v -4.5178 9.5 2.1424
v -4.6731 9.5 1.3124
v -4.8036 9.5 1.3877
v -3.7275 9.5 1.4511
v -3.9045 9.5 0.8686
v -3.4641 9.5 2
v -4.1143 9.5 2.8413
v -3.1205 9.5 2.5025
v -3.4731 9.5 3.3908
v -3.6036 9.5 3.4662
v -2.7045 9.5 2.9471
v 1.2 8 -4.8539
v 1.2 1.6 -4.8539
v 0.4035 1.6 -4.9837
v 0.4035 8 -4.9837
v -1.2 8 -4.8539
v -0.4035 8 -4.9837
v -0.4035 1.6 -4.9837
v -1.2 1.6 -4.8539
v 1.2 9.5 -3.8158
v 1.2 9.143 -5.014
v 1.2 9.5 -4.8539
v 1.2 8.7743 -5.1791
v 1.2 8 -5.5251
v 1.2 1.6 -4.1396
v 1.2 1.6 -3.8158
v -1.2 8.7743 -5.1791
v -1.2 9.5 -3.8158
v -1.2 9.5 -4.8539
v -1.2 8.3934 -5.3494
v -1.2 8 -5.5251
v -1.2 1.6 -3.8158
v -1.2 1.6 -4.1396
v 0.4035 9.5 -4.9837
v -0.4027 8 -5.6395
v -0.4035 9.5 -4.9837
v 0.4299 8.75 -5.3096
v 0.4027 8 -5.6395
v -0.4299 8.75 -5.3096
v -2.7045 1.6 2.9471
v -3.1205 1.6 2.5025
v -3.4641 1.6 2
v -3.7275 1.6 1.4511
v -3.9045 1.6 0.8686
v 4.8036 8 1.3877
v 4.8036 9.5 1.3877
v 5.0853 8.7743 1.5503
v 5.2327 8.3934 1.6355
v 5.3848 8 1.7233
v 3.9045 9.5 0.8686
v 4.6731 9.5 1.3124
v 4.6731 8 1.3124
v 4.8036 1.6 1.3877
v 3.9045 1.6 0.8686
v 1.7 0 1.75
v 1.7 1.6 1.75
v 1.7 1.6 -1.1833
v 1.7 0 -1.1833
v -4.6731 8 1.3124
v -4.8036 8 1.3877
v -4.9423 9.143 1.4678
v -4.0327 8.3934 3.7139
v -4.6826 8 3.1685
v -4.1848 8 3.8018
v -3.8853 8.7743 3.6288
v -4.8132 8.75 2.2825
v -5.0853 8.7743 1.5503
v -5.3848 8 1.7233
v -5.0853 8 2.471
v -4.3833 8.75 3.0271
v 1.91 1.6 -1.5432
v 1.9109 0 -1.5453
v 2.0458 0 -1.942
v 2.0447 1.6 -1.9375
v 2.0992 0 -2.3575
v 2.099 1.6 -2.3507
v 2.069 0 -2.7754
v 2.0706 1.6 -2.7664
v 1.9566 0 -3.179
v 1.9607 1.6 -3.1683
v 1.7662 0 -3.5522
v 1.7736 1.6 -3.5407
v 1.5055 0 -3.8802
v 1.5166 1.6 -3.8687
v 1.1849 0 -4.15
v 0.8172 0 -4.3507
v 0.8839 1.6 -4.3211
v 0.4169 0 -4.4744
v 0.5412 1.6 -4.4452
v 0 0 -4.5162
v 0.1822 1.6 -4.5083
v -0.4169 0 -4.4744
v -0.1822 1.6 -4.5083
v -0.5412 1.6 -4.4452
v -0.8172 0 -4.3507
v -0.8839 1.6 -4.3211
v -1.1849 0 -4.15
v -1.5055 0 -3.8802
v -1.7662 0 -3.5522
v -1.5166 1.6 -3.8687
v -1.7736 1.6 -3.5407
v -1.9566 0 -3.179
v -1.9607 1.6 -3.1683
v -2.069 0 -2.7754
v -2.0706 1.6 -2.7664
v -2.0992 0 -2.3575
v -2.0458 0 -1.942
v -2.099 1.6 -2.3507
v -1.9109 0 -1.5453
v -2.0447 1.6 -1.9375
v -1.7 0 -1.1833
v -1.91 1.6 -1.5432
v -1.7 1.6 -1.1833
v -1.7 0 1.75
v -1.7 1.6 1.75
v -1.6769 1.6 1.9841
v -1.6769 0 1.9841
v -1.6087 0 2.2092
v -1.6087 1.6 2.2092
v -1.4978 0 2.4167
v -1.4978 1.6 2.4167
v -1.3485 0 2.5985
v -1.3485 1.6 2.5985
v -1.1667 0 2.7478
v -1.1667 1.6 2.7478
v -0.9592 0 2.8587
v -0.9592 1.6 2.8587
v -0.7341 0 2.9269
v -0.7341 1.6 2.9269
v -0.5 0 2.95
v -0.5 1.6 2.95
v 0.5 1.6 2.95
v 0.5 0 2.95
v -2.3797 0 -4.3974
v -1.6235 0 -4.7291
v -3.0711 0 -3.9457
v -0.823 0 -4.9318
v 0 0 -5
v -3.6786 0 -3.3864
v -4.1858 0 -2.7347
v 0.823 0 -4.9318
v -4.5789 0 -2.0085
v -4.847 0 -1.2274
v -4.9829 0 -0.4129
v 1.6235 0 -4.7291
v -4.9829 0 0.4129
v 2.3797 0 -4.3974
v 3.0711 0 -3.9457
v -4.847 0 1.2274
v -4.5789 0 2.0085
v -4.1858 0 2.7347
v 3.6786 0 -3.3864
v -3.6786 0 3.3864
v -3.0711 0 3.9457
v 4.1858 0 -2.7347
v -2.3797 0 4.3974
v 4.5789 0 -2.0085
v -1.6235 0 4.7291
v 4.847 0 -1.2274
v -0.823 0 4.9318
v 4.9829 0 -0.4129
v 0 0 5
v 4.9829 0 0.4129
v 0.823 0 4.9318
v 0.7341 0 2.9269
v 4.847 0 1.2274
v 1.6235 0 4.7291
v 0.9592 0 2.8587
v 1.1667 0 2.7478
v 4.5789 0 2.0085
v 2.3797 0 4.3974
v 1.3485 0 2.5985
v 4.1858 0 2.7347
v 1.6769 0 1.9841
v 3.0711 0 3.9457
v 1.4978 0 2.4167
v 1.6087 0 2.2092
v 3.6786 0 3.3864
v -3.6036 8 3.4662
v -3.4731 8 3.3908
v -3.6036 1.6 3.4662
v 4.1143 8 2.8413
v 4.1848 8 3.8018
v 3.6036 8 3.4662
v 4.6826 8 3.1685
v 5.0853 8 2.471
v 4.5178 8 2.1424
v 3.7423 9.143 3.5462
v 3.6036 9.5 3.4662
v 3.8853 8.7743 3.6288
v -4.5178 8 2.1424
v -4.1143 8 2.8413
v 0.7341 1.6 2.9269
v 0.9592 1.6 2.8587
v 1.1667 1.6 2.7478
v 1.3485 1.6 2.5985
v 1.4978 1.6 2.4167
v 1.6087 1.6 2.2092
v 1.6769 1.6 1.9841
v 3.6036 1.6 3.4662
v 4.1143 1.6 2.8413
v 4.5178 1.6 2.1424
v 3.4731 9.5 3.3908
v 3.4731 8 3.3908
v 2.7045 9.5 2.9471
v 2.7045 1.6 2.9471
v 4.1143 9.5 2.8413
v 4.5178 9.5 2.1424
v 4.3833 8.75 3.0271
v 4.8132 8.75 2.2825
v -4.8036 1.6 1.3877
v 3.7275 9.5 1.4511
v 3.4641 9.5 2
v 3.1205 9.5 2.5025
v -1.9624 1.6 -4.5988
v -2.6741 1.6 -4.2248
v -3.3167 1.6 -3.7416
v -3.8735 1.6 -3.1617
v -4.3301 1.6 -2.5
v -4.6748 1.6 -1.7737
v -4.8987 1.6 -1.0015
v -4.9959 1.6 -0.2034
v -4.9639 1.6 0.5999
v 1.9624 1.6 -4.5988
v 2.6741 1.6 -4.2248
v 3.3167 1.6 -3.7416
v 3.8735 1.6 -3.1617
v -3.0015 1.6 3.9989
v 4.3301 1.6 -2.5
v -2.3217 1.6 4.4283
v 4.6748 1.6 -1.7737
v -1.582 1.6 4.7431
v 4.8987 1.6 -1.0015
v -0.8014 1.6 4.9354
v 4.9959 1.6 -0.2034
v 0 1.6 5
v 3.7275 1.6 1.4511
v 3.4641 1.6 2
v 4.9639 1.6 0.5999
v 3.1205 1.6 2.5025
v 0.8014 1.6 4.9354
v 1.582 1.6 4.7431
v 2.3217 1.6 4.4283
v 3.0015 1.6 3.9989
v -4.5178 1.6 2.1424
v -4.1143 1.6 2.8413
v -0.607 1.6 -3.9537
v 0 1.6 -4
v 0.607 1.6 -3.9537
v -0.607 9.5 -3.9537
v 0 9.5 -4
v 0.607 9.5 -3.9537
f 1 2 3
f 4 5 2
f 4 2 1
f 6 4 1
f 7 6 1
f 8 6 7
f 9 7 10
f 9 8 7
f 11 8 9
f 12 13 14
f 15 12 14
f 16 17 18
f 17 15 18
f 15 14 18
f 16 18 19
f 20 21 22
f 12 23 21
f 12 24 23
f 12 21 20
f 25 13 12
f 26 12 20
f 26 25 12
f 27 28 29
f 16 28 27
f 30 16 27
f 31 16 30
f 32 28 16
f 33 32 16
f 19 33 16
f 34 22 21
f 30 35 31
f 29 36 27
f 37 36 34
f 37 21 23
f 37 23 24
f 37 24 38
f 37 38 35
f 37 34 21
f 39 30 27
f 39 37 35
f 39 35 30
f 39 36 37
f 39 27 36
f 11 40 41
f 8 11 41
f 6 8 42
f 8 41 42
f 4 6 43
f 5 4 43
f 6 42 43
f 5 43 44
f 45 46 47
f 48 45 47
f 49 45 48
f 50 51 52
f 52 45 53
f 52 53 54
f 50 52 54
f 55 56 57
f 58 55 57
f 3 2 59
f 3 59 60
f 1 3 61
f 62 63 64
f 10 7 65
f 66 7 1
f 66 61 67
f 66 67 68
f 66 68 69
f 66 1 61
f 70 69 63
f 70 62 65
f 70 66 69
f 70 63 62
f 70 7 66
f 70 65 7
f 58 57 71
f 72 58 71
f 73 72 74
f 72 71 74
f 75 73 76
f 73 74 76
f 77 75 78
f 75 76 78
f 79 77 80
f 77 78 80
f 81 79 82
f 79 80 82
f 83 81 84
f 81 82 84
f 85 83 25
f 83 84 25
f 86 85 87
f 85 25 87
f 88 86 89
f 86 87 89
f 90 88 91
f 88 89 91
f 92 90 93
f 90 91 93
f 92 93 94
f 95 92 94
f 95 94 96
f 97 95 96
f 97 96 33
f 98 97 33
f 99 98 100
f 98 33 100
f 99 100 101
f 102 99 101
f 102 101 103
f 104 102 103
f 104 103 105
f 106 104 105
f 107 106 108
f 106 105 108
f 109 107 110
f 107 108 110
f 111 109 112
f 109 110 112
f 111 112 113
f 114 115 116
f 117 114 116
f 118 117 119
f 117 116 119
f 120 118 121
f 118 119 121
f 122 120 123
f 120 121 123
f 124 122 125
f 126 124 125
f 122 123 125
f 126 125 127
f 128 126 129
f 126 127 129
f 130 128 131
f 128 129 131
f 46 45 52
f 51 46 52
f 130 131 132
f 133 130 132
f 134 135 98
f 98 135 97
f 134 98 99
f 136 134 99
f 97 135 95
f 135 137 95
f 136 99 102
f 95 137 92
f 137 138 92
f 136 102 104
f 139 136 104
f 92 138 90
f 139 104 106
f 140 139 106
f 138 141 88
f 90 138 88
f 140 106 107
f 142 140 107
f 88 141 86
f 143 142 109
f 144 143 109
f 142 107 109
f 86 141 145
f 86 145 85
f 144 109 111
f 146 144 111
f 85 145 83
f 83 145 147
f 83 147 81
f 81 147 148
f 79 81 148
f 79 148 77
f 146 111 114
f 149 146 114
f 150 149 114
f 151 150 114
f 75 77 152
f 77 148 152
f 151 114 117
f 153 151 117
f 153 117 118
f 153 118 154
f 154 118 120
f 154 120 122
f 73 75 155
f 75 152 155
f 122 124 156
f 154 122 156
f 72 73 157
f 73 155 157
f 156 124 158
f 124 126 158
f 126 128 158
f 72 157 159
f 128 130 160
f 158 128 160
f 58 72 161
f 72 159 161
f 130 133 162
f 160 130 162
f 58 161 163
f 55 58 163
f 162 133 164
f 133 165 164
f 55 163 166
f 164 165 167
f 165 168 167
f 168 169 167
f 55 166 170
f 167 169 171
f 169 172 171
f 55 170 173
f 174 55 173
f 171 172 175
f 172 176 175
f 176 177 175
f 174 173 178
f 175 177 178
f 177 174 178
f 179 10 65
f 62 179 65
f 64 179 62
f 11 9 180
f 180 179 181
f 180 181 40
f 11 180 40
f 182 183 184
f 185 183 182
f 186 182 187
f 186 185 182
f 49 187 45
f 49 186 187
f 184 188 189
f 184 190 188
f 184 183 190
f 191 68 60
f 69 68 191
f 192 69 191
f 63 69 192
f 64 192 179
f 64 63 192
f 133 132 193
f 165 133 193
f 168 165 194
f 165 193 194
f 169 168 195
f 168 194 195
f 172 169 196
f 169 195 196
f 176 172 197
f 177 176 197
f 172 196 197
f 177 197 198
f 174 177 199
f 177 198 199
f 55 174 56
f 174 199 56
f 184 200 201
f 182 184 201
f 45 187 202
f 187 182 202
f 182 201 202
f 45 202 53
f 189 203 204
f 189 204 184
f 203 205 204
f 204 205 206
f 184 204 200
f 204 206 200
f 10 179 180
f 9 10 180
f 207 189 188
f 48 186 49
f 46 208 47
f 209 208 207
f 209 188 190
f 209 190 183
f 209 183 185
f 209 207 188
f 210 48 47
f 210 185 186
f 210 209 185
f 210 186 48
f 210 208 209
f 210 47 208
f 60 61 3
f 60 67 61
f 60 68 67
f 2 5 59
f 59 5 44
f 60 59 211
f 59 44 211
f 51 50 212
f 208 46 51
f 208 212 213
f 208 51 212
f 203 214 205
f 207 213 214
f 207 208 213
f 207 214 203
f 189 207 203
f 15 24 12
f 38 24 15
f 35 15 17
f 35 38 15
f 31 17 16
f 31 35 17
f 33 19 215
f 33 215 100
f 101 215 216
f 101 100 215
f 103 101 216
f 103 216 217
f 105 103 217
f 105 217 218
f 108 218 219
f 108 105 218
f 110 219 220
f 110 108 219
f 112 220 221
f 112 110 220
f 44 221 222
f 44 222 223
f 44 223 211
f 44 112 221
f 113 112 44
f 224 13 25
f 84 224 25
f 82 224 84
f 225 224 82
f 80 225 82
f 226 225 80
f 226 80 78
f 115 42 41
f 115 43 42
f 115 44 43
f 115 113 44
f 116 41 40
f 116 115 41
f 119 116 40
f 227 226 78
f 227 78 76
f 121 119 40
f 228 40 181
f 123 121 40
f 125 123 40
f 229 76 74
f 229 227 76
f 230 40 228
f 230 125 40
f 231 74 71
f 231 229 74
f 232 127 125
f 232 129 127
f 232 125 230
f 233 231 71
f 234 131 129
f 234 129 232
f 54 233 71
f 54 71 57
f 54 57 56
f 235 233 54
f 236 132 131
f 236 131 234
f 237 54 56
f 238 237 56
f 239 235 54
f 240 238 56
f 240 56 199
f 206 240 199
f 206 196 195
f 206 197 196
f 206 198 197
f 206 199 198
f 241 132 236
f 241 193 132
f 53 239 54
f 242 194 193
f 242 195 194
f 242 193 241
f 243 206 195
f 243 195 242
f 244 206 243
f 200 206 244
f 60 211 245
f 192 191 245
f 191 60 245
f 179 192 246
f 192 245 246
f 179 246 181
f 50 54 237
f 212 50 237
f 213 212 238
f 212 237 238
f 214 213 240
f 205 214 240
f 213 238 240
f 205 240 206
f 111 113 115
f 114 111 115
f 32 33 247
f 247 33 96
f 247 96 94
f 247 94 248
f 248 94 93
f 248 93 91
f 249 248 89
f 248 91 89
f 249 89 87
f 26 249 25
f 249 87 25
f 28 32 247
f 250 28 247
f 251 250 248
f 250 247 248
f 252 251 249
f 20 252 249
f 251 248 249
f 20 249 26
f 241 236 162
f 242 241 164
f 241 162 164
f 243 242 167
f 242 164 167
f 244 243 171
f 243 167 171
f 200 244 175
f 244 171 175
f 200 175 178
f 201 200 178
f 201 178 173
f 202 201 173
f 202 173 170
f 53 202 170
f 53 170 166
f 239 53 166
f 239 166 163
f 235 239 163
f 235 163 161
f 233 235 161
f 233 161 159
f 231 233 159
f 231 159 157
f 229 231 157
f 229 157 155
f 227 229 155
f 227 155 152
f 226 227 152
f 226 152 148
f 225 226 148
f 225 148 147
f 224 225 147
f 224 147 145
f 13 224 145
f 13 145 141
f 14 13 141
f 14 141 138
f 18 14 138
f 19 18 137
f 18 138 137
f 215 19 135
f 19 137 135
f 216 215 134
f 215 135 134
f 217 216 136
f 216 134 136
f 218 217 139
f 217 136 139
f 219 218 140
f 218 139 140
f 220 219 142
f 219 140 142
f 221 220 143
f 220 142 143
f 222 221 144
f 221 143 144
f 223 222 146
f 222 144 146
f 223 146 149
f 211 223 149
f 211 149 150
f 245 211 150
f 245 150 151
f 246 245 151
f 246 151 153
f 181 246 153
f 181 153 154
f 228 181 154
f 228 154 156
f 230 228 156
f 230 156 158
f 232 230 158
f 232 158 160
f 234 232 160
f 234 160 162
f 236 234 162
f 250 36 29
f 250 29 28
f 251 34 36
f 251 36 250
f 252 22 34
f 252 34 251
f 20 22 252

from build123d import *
from build123d.topology import SkipClean

# Parameters (mm, degrees)
SKETCH1_R           = 5
BOSS_EXTRUDE1_DEPTH = 1.6
BOSS_EXTRUDE2_DEPTH = 7.9
CIRPATTERN3_COUNT   = 3
CUT_EXTRUDE2_DEPTH  = 12.240212189
CUT_EXTRUDE3_DEPTH  = 12.310719255
CUT_EXTRUDE4_DEPTH  = 12.10732297


with BuildPart() as part:
    # Sketch1 → Boss-Extrude1 (new body)
    with BuildSketch(Plane(origin=(0, 0, 0), x_dir=(1, 0, 0), z_dir=(0, 1, 0))):
        Circle(SKETCH1_R)
    extrude(amount=BOSS_EXTRUDE1_DEPTH)

    # Sketch2 → Boss-Extrude2 (add)
    with BuildSketch(Plane(origin=(0, 1.6, 0), x_dir=(1, 0, 0), z_dir=(0, 1, 0))):
        with BuildLine():
            Line((-1.2, 4.85386444), (-1.2, 3.815756806))
            ThreePointArc((-1.2, 3.815756806), (0, 4), (1.2, 3.815756806))
            Line((1.2, 3.815756806), (1.2, 4.85386444))
            ThreePointArc((1.2, 4.85386444), (0, 5), (-1.2, 4.85386444))
        make_face()
    boss_extrude2 = extrude(amount=BOSS_EXTRUDE2_DEPTH)

    # CirPattern3: Boss-Extrude2 ×3 about axis
    cirpattern3_axis = Axis((0, 1.6, 0), (0, -1, 0))
    for i in range(1, CIRPATTERN3_COUNT):
        add(boss_extrude2.rotate(cirpattern3_axis, i * 360 / CIRPATTERN3_COUNT))

    # Sweep3: sweep along a path in Sketch6
    with SkipClean():  # the faces are left unmerged after this step: merging them gives an invalid solid
        with BuildLine(Plane(origin=(0, 9.5, 0), x_dir=(1, 0, 0), z_dir=(0, 1, 0))) as sweep3_path:
            CenterArc((0, 0), 5, 0, 360)
        # Sketch3 → Sweep3 (sweep)
        with BuildSketch(Plane(origin=(0, 0, 0), x_dir=(0, 0, -1), z_dir=(1, 0, 0))):
            Polygon((5, 9.5), (5.65386444, 8), (4.85386444, 8), (4.85386444, 9.5), align=None)
        sweep(path=sweep3_path.line)
    add(part.part.scale(1), mode=Mode.REPLACE)  # the faces are merged on a copy

    # Sketch7 → Cut-Extrude2 (cut, through all)
    with BuildSketch(Plane(origin=(0, 1.6, 0), x_dir=(1, 0, 0), z_dir=(0, 1, 0))):
        with BuildLine():
            Line((-3.904542328, -0.868647918), (-4.803569911, -1.387701735))
            ThreePointArc((-4.803569911, -1.387701735), (-4.330127019, 2.5), (-1.2, 4.85386444))
            Line((-1.2, 4.85386444), (-1.2, 3.815756806))
            ThreePointArc((-1.2, 3.815756806), (0, 4), (1.2, 3.815756806))
            Line((1.2, 3.815756806), (1.2, 4.85386444))
            ThreePointArc((1.2, 4.85386444), (4.330127019, 2.5), (4.803569911, -1.387701735))
            Line((4.803569911, -1.387701735), (3.904542328, -0.868647918))
            ThreePointArc((3.904542328, -0.868647918), (3.464101615, -2), (2.704542328, -2.947108887))
            Line((2.704542328, -2.947108887), (3.603569911, -3.466162704))
            ThreePointArc((3.603569911, -3.466162704), (0, -5), (-3.603569911, -3.466162704))
            Line((-3.603569911, -3.466162704), (-2.704542328, -2.947108887))
            ThreePointArc((-2.704542328, -2.947108887), (-3.464101615, -2), (-3.904542328, -0.868647918))
        make_face()
    extrude(amount=CUT_EXTRUDE2_DEPTH, mode=Mode.SUBTRACT)

    # Sketch8 → Cut-Extrude3 (cut, through all)
    with BuildSketch(Plane.XZ.offset(-8)):
        with BuildLine():
            Line((-3.603569911, 3.466162704), (-4.184834096, 3.801755738))
            ThreePointArc((-4.184834096, 3.801755738), (0, 5.65386444), (4.184834096, 3.801755738))
            Line((4.184834096, 3.801755738), (3.603569911, 3.466162704))
            ThreePointArc((3.603569911, 3.466162704), (0, 5), (-3.603569911, 3.466162704))
        make_face()
        with BuildLine():
            Line((-5.384834096, 1.723294769), (-4.803569911, 1.387701735))
            ThreePointArc((-4.803569911, 1.387701735), (-4.330127019, -2.5), (-1.2, -4.85386444))
            Line((-1.2, -4.85386444), (-1.2, -5.525050507))
            ThreePointArc((-1.2, -5.525050507), (-4.896390234, -2.82693222), (-5.384834096, 1.723294769))
        make_face()
        with BuildLine():
            Line((1.2, -5.525050507), (1.2, -4.85386444))
            ThreePointArc((1.2, -4.85386444), (4.330127019, -2.5), (4.803569911, 1.387701735))
            Line((4.803569911, 1.387701735), (5.384834096, 1.723294769))
            ThreePointArc((5.384834096, 1.723294769), (4.896390234, -2.82693222), (1.2, -5.525050507))
        make_face()
    extrude(amount=-CUT_EXTRUDE3_DEPTH, mode=Mode.SUBTRACT)

    # Sketch9 → Cut-Extrude4 (cut, through all)
    with BuildSketch(Plane(origin=(0, 1.6, 0), x_dir=(1, 0, 0), z_dir=(0, 1, 0))):
        with BuildLine():
            Line((-1.7, 1.183307578), (-1.7, -1.75))
            ThreePointArc((-1.7, -1.75), (-1.348528137, -2.598528137), (-0.5, -2.95))
            Line((-0.5, -2.95), (0.5, -2.95))
            ThreePointArc((0.5, -2.95), (1.348528137, -2.598528137), (1.7, -1.75))
            Line((1.7, -1.75), (1.7, 1.183307578))
            ThreePointArc((1.7, 1.183307578), (0, 4.516190379), (-1.7, 1.183307578))
        make_face()
    extrude(amount=-CUT_EXTRUDE4_DEPTH, mode=Mode.SUBTRACT)


solid = part.part
